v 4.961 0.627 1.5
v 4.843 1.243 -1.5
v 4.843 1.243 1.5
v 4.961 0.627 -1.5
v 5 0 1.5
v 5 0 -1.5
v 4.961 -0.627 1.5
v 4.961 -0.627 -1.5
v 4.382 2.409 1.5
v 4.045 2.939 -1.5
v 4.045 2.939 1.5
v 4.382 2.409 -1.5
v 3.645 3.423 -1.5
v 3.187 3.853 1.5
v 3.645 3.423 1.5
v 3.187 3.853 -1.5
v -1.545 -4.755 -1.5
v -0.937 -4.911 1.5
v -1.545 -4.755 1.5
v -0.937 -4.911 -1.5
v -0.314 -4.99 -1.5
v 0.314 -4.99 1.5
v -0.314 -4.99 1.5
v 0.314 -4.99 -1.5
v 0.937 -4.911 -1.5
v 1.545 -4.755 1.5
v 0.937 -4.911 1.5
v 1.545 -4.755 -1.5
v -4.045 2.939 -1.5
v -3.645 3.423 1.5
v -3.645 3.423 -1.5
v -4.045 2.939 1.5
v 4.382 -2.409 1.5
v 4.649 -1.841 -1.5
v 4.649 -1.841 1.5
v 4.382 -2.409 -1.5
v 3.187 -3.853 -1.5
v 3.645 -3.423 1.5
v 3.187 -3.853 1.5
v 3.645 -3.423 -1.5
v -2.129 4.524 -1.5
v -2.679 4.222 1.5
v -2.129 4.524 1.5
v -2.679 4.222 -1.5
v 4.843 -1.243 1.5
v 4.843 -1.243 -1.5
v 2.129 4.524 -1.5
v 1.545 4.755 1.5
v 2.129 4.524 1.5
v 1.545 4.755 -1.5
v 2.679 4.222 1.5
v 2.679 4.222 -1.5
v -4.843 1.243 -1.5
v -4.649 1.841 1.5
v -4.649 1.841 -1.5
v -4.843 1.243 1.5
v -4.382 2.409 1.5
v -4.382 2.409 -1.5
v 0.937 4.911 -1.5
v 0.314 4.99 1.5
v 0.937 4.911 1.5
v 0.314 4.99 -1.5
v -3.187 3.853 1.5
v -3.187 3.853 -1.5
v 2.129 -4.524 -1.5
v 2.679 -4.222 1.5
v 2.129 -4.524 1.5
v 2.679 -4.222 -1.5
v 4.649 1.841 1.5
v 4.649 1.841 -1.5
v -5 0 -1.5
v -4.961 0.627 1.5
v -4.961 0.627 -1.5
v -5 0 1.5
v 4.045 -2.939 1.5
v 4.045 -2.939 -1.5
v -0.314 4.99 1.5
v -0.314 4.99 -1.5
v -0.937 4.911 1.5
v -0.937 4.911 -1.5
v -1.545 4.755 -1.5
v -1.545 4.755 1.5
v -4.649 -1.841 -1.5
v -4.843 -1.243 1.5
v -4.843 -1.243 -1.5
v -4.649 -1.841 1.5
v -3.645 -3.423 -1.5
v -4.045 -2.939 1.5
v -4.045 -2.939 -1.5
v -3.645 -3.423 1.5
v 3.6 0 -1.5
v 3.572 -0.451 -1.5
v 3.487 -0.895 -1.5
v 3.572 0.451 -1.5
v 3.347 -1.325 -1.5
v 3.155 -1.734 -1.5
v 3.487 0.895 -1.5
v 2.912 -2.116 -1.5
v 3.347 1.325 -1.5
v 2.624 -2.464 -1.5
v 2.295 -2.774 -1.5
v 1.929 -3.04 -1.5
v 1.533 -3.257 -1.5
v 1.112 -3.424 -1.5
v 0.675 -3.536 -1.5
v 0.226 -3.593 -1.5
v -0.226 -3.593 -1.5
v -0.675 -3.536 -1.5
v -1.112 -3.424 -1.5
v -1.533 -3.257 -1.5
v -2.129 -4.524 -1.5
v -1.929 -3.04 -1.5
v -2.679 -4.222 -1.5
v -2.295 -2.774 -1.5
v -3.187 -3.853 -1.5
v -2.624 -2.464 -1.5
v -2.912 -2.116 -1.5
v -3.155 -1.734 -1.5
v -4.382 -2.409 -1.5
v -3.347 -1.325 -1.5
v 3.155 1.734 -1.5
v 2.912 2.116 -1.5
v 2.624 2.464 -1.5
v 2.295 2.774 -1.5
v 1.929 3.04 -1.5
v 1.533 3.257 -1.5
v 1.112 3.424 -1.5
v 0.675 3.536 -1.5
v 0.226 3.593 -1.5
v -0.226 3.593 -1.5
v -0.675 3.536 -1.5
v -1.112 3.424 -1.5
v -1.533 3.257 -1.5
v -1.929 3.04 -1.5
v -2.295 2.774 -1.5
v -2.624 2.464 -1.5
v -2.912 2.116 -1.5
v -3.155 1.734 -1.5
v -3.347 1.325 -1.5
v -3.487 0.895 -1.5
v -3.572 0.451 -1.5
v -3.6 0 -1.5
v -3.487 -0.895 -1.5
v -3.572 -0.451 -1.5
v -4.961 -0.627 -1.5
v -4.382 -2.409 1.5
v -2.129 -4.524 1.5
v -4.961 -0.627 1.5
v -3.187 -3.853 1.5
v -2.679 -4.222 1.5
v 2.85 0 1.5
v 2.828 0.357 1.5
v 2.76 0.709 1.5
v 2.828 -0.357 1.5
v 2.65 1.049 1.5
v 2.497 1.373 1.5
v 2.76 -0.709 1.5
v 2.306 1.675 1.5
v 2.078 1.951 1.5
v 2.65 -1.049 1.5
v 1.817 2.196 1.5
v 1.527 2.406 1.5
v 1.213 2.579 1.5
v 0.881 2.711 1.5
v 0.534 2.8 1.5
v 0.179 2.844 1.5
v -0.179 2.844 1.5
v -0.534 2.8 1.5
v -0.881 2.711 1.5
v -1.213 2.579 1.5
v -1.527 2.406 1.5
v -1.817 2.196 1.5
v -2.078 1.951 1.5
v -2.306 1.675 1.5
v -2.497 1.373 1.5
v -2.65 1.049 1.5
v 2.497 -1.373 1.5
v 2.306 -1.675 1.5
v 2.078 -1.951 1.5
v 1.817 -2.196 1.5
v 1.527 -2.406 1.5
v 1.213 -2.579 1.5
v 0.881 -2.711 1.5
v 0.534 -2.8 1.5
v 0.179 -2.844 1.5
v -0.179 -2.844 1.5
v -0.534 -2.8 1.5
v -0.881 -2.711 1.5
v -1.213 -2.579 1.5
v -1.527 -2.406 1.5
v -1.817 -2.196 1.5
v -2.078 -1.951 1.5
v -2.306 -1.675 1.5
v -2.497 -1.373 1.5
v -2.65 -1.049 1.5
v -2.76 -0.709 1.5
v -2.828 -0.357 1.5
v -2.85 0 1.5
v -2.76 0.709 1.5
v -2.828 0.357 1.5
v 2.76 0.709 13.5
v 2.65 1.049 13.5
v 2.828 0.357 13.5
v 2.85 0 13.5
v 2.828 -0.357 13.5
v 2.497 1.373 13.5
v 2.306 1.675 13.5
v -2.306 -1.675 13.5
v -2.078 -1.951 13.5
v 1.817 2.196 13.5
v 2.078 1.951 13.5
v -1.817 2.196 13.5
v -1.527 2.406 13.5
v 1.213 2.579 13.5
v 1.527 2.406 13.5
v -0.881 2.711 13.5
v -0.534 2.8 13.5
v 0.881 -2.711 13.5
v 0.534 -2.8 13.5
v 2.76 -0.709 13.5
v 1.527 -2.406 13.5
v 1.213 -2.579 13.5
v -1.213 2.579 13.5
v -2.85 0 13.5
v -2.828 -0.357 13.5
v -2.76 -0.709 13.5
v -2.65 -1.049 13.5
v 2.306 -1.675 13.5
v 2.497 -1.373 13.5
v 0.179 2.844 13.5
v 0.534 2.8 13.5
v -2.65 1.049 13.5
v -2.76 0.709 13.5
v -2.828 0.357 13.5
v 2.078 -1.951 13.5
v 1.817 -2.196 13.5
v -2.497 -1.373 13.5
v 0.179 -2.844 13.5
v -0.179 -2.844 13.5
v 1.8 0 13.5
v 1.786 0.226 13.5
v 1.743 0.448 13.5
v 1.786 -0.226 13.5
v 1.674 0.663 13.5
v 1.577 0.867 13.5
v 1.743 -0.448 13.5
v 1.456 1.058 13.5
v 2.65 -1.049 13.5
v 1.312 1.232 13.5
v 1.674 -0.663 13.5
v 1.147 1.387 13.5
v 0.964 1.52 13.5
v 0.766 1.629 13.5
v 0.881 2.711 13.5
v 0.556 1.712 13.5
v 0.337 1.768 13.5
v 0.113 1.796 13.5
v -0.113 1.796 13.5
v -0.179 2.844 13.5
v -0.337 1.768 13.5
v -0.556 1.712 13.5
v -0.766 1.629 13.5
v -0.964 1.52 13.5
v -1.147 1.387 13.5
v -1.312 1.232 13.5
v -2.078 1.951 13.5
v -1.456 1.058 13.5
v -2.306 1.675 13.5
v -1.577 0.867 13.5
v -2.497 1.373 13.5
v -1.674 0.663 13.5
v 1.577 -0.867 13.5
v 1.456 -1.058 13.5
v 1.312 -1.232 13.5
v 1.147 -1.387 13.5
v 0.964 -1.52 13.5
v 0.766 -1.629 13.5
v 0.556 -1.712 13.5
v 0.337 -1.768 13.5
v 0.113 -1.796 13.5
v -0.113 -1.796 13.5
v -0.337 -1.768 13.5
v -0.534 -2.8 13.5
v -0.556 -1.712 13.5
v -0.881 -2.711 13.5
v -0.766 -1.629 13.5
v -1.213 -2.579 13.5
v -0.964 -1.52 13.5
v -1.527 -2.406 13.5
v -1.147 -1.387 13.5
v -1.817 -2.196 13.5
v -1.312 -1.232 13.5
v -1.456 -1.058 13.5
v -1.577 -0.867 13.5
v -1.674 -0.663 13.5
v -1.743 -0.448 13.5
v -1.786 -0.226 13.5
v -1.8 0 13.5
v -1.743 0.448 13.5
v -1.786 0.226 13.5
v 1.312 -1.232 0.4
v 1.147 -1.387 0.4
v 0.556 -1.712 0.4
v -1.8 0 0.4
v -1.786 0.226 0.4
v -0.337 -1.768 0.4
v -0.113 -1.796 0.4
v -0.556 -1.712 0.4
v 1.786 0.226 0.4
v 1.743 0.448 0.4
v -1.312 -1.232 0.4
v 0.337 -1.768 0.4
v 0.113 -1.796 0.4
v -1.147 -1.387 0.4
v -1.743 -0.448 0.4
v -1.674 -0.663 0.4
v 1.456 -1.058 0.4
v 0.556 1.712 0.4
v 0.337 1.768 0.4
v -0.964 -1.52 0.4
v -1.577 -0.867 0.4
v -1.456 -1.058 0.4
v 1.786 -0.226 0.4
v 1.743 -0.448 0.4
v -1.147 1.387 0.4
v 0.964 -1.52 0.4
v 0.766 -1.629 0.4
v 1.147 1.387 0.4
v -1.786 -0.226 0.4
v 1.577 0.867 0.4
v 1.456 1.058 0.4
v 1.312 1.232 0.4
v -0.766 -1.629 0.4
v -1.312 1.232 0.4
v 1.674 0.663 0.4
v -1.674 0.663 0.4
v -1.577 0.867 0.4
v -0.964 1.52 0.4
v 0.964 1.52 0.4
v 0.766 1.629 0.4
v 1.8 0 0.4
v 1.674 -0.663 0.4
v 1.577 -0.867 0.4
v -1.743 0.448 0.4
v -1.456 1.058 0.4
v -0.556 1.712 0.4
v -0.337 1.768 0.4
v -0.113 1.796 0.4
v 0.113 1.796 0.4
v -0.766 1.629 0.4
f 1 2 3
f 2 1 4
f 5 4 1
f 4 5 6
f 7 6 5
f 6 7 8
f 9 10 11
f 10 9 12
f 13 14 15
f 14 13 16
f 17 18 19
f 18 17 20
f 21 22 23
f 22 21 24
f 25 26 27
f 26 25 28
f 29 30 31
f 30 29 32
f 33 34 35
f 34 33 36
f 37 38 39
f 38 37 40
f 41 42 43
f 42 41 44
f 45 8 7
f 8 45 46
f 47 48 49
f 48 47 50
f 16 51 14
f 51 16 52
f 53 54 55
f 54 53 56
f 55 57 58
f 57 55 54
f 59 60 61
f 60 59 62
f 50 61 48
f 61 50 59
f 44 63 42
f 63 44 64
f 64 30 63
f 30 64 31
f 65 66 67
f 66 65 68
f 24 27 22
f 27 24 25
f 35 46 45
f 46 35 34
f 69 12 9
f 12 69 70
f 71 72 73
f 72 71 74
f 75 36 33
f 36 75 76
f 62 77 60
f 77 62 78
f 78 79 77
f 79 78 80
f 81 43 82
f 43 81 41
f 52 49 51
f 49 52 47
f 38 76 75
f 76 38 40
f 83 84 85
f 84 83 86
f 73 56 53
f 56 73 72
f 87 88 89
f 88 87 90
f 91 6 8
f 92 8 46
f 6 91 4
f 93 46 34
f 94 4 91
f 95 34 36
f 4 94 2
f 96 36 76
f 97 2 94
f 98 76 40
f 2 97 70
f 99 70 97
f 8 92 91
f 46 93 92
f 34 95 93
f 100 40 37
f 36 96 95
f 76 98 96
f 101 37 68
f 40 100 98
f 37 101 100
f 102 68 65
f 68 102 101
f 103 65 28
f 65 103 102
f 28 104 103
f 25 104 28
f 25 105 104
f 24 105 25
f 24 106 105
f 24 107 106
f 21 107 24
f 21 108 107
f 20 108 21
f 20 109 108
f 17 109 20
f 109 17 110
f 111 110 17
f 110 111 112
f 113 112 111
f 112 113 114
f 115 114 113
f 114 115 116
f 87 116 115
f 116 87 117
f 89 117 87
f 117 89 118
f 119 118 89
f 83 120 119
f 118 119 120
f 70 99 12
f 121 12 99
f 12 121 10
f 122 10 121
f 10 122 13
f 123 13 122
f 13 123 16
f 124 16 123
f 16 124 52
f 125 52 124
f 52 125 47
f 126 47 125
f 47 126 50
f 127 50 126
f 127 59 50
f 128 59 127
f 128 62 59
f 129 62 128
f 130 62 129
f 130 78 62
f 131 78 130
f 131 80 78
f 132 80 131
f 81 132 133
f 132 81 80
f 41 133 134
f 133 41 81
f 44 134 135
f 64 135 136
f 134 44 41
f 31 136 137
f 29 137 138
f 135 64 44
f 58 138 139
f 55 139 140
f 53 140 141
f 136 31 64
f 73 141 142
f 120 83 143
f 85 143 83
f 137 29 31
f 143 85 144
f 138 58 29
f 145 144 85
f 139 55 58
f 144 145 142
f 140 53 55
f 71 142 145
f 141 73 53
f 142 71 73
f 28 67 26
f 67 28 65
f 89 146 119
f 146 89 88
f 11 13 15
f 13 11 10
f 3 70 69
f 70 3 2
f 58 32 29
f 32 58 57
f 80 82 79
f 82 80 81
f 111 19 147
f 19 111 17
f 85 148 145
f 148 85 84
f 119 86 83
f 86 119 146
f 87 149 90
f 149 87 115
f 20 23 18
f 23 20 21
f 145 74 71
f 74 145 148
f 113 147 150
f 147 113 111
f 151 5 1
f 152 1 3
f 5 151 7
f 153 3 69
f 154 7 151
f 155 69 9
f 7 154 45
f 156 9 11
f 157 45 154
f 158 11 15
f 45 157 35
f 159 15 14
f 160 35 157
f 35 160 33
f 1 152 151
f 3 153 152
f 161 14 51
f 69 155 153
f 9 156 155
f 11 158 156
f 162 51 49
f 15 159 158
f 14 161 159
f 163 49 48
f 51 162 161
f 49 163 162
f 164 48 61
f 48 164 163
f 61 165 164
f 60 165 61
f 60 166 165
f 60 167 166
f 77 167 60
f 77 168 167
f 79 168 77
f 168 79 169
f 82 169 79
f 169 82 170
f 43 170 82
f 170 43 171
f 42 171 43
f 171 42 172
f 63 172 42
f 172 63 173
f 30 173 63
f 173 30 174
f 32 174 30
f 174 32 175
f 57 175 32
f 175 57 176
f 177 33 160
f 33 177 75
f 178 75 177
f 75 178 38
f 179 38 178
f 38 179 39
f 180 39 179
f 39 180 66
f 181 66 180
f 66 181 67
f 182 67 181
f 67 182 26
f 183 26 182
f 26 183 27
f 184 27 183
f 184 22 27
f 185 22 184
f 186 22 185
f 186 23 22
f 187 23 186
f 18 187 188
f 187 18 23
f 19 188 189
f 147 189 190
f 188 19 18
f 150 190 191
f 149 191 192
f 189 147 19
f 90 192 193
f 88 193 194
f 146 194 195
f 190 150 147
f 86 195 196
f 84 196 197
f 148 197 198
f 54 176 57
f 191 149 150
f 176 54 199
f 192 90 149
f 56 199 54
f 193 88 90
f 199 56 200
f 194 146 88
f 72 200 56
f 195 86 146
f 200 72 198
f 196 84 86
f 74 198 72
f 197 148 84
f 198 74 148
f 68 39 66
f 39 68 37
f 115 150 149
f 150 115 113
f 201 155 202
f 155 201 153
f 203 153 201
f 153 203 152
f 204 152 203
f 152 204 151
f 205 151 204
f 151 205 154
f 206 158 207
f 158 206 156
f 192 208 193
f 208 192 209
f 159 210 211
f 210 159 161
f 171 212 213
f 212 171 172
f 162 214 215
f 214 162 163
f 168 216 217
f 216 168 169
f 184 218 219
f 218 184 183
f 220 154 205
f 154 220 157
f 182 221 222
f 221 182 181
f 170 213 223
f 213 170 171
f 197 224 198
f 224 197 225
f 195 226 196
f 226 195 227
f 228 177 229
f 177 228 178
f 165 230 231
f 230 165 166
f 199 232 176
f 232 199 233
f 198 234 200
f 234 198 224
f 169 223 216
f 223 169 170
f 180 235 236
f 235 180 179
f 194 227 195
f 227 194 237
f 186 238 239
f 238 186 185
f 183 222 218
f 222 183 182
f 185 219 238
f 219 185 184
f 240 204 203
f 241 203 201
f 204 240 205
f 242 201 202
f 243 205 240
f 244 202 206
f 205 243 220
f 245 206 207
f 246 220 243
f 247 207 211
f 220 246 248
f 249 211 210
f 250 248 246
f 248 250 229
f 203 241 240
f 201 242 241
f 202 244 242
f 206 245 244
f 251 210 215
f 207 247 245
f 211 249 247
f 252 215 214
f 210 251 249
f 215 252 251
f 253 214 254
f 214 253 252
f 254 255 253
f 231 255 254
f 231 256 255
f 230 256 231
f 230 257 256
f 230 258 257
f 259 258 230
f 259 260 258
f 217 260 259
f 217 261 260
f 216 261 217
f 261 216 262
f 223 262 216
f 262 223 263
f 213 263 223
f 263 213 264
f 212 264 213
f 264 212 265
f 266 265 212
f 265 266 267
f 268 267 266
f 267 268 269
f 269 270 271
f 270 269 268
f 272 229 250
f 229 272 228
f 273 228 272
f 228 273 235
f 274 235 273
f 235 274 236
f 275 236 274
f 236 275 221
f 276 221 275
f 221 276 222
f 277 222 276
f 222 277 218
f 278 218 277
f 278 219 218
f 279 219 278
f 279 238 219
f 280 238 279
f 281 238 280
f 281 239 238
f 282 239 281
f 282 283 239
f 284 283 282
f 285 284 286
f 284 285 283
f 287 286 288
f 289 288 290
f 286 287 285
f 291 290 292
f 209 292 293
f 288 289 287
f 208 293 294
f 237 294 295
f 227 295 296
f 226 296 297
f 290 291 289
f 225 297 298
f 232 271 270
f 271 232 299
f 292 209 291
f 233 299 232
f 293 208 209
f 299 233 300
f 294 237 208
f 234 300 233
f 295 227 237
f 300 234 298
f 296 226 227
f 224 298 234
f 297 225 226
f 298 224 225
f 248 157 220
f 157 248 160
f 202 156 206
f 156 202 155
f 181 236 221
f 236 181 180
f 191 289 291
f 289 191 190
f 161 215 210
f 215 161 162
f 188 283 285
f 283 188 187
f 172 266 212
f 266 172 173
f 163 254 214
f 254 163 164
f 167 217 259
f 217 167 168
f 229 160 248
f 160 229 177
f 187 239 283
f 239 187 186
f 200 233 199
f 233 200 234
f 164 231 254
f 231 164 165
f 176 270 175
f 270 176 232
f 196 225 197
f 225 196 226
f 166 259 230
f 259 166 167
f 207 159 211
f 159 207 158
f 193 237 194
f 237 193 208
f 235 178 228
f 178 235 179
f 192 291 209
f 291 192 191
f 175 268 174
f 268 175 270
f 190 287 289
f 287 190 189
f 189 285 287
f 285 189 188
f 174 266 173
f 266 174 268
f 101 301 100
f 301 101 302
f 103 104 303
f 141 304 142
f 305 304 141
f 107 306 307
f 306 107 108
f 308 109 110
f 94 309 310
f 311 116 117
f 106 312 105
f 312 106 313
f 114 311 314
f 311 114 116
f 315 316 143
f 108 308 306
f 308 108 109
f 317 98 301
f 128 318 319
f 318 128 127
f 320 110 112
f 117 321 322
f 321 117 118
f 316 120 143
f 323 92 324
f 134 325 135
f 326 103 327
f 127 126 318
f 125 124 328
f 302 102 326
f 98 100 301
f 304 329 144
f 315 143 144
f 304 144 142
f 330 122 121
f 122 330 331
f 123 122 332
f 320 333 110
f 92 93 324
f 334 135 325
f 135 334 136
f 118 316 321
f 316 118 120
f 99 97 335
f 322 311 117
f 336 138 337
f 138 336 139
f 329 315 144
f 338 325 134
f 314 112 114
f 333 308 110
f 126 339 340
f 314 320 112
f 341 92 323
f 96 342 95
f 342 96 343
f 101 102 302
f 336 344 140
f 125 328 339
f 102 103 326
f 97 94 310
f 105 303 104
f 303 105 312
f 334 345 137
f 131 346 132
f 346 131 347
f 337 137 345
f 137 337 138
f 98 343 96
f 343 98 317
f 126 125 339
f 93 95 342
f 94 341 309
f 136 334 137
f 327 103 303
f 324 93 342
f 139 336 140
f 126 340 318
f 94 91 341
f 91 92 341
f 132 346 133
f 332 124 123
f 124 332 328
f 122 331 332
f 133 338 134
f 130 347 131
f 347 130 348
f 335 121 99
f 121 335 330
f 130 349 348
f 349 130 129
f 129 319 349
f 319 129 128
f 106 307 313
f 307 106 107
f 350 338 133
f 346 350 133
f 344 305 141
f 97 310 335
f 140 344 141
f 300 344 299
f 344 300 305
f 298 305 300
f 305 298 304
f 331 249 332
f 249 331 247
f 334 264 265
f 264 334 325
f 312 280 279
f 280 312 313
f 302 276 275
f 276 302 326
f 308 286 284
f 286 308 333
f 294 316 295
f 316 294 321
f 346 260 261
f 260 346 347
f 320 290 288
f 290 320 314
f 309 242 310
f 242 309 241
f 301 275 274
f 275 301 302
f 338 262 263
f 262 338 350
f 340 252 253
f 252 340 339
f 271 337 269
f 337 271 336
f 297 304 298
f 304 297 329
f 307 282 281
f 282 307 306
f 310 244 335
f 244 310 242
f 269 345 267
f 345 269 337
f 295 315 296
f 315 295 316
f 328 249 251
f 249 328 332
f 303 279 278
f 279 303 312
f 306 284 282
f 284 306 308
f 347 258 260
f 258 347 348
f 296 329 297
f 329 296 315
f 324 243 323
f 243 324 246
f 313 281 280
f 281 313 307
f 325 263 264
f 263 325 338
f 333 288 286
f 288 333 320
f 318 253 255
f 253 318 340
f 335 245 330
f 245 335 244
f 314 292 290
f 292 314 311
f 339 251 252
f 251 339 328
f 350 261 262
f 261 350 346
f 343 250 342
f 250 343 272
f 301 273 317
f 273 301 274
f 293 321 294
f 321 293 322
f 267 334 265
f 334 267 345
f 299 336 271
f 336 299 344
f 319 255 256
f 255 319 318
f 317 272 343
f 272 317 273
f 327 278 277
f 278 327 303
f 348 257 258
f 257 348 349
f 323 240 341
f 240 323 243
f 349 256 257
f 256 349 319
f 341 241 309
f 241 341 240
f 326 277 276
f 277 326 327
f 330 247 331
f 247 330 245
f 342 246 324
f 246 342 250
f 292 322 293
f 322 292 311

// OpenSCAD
$fn = 50;


difference() {
	union() {
		translate(v = [0, 0, -1.5000000000]) {
			cylinder(h = 3, r = 5.0000000000);
		}
		translate(v = [0, 0, -1.5000000000]) {
			cylinder(h = 15, r = 2.8500000000);
		}
	}
	union() {
		translate(v = [0, 0, -1.5000000000]) {
			rotate(a = [0, 180, 0]) {
				difference() {
					union() {
						translate(v = [0, 0, -15.0000000000]) {
							cylinder(h = 15, r = 1.5000000000);
						}
						translate(v = [0, 0, -1.9000000000]) {
							cylinder(h = 1.9000000000, r1 = 1.8000000000, r2 = 3.6000000000);
						}
						translate(v = [0, 0, -15.0000000000]) {
							cylinder(h = 15, r = 1.8000000000);
						}
						translate(v = [0, 0, -15.0000000000]) {
							cylinder(h = 15, r = 1.5000000000);
						}
					}
					union();
				}
			}
		}
		translate(v = [0, 0, -100.0000000000]) {
			cylinder(h = 200, r = 1.8000000000);
		}
	}
}
